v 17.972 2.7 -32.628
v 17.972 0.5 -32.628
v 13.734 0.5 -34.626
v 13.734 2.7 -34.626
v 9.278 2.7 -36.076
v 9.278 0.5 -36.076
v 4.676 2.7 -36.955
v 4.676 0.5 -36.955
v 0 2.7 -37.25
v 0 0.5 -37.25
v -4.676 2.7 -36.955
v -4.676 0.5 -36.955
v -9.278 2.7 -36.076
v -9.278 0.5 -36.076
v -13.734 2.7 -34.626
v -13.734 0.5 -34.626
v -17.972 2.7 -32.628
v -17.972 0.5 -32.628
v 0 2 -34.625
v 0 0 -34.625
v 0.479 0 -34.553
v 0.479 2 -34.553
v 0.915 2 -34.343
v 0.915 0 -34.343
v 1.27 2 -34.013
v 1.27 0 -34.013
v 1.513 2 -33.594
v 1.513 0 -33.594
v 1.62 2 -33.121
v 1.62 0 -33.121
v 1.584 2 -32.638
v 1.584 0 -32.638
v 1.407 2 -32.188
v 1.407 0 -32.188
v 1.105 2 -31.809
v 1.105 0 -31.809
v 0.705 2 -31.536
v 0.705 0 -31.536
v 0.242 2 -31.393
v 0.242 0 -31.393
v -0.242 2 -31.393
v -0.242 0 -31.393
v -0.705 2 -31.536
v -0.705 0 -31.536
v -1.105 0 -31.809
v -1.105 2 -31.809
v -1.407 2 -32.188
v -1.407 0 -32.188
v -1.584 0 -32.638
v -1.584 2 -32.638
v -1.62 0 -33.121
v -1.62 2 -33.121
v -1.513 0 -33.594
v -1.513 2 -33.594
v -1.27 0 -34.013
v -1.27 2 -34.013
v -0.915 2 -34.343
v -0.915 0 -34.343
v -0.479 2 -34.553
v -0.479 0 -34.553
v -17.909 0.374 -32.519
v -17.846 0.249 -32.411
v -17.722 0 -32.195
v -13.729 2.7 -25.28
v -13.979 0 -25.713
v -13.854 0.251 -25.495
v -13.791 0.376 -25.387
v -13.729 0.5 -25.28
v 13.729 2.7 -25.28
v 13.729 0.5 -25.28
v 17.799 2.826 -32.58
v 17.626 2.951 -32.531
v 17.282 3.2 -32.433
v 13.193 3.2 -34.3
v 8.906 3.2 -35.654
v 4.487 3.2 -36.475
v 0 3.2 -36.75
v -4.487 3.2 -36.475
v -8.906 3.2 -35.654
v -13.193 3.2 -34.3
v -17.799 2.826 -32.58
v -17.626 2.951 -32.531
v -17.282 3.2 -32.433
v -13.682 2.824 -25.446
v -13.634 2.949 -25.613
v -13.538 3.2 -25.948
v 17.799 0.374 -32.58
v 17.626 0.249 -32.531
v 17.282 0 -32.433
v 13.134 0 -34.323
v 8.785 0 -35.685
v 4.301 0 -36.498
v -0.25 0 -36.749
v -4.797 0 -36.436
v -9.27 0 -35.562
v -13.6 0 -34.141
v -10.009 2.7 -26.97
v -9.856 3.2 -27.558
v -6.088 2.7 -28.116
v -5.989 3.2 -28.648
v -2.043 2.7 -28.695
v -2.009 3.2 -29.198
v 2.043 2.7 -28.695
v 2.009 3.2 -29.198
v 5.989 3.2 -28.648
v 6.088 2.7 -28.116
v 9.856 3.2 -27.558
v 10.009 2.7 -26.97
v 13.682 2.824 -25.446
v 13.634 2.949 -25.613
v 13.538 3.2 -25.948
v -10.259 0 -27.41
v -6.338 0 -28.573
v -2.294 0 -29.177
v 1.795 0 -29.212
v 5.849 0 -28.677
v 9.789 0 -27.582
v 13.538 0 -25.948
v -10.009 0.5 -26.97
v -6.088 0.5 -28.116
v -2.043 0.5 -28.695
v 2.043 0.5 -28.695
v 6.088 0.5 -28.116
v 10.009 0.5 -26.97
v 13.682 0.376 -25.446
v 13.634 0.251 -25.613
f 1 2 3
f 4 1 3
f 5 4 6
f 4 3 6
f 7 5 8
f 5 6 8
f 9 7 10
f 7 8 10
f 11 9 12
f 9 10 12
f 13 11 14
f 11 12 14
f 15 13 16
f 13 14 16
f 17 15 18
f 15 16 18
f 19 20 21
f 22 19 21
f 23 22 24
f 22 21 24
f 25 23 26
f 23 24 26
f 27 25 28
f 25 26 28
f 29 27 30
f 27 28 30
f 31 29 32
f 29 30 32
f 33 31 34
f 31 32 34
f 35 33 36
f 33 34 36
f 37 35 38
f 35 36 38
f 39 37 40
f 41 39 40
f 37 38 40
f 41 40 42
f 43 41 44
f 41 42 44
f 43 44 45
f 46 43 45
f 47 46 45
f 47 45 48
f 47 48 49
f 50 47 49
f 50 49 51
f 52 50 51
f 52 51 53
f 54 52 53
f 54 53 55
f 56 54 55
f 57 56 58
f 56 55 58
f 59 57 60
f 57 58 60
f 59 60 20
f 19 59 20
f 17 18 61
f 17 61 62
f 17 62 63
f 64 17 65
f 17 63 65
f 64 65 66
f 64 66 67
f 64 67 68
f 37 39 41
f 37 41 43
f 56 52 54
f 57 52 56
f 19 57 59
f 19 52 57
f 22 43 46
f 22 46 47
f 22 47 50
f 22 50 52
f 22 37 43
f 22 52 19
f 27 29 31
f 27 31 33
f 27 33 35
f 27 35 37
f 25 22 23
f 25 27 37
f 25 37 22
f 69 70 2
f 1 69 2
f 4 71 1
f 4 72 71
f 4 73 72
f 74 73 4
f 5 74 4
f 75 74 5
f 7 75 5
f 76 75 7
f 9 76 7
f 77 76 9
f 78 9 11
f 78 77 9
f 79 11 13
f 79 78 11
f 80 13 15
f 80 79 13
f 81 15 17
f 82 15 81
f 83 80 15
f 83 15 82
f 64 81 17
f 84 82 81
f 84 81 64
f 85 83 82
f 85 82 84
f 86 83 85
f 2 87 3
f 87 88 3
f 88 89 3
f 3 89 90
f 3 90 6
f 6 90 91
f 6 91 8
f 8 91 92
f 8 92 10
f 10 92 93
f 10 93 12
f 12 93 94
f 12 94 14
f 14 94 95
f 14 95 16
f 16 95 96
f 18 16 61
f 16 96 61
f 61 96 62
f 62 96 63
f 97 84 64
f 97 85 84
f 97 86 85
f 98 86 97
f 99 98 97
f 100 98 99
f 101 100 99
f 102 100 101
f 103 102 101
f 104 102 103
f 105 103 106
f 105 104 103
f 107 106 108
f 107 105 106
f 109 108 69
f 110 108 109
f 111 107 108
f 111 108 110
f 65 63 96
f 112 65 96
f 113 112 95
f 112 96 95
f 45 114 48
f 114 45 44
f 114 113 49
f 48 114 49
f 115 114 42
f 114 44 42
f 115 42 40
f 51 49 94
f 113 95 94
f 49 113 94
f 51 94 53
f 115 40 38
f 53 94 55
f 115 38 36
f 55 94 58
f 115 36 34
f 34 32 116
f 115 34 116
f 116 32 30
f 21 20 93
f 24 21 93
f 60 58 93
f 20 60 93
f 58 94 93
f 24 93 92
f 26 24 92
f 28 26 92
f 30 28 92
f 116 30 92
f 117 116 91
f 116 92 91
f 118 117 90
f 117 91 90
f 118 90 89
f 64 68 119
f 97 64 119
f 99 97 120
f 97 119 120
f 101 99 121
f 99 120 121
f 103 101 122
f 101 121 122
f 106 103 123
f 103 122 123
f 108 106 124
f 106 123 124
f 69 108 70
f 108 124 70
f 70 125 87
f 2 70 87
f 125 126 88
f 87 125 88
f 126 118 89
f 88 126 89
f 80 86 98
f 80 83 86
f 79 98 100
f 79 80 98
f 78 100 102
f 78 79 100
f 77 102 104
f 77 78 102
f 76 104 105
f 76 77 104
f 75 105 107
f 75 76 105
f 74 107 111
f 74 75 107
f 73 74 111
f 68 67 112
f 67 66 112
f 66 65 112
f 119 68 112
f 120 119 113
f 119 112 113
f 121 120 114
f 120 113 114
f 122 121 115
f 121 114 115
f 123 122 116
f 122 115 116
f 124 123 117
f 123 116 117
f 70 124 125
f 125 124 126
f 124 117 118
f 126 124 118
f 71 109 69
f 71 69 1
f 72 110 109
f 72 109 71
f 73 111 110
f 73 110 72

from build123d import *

# Parameters (mm, degrees)
BOSS_EXTRUDE1_DEPTH = 3.2
CHAMFER1_SIZE       = 0.5
SKETCH2_R           = 1.625
CUT_EXTRUDE1_DEPTH  = 2


with BuildPart() as part:
    # Sketch1 → Boss-Extrude1 (new body)
    with BuildSketch(Plane(origin=(0, 0, 0), x_dir=(1, 0, 0), z_dir=(0, 1, 0))):
        with BuildLine():
            Line((-17.971705397, 32.627906846), (-13.729256498, 25.279769804))
            ThreePointArc((-13.729256498, 25.279769804), (0, 28.767329478), (13.729256498, 25.279769804))
            Line((13.729256498, 25.279769804), (17.971705397, 32.627906846))
            ThreePointArc((17.971705397, 32.627906846), (0, 37.25), (-17.971705397, 32.627906846))
        make_face()
    extrude(amount=BOSS_EXTRUDE1_DEPTH)

    # Chamfer1
    chamfer1_edges = [part.edges().sort_by_distance(p)[0] for p in [
        (0, 3.2, -28.767329478),
        (15.850480947, 3.2, -28.953838325),
        (0, 3.2, -37.25),
        (15.850480947, 0, -28.953838325),
        (0, 0, -28.767329478),
        (0, 0, -37.25),
        (-15.850480947, 3.2, -28.953838325),
    ]]
    chamfer(chamfer1_edges, length=CHAMFER1_SIZE)

    # Sketch2 → Cut-Extrude1 (cut)
    with BuildSketch(Plane.XZ):
        with Locations(Location((0, -33, 0), (0, 0, 270))):
            Circle(SKETCH2_R)
    extrude(amount=-CUT_EXTRUDE1_DEPTH, mode=Mode.SUBTRACT)


solid = part.part
